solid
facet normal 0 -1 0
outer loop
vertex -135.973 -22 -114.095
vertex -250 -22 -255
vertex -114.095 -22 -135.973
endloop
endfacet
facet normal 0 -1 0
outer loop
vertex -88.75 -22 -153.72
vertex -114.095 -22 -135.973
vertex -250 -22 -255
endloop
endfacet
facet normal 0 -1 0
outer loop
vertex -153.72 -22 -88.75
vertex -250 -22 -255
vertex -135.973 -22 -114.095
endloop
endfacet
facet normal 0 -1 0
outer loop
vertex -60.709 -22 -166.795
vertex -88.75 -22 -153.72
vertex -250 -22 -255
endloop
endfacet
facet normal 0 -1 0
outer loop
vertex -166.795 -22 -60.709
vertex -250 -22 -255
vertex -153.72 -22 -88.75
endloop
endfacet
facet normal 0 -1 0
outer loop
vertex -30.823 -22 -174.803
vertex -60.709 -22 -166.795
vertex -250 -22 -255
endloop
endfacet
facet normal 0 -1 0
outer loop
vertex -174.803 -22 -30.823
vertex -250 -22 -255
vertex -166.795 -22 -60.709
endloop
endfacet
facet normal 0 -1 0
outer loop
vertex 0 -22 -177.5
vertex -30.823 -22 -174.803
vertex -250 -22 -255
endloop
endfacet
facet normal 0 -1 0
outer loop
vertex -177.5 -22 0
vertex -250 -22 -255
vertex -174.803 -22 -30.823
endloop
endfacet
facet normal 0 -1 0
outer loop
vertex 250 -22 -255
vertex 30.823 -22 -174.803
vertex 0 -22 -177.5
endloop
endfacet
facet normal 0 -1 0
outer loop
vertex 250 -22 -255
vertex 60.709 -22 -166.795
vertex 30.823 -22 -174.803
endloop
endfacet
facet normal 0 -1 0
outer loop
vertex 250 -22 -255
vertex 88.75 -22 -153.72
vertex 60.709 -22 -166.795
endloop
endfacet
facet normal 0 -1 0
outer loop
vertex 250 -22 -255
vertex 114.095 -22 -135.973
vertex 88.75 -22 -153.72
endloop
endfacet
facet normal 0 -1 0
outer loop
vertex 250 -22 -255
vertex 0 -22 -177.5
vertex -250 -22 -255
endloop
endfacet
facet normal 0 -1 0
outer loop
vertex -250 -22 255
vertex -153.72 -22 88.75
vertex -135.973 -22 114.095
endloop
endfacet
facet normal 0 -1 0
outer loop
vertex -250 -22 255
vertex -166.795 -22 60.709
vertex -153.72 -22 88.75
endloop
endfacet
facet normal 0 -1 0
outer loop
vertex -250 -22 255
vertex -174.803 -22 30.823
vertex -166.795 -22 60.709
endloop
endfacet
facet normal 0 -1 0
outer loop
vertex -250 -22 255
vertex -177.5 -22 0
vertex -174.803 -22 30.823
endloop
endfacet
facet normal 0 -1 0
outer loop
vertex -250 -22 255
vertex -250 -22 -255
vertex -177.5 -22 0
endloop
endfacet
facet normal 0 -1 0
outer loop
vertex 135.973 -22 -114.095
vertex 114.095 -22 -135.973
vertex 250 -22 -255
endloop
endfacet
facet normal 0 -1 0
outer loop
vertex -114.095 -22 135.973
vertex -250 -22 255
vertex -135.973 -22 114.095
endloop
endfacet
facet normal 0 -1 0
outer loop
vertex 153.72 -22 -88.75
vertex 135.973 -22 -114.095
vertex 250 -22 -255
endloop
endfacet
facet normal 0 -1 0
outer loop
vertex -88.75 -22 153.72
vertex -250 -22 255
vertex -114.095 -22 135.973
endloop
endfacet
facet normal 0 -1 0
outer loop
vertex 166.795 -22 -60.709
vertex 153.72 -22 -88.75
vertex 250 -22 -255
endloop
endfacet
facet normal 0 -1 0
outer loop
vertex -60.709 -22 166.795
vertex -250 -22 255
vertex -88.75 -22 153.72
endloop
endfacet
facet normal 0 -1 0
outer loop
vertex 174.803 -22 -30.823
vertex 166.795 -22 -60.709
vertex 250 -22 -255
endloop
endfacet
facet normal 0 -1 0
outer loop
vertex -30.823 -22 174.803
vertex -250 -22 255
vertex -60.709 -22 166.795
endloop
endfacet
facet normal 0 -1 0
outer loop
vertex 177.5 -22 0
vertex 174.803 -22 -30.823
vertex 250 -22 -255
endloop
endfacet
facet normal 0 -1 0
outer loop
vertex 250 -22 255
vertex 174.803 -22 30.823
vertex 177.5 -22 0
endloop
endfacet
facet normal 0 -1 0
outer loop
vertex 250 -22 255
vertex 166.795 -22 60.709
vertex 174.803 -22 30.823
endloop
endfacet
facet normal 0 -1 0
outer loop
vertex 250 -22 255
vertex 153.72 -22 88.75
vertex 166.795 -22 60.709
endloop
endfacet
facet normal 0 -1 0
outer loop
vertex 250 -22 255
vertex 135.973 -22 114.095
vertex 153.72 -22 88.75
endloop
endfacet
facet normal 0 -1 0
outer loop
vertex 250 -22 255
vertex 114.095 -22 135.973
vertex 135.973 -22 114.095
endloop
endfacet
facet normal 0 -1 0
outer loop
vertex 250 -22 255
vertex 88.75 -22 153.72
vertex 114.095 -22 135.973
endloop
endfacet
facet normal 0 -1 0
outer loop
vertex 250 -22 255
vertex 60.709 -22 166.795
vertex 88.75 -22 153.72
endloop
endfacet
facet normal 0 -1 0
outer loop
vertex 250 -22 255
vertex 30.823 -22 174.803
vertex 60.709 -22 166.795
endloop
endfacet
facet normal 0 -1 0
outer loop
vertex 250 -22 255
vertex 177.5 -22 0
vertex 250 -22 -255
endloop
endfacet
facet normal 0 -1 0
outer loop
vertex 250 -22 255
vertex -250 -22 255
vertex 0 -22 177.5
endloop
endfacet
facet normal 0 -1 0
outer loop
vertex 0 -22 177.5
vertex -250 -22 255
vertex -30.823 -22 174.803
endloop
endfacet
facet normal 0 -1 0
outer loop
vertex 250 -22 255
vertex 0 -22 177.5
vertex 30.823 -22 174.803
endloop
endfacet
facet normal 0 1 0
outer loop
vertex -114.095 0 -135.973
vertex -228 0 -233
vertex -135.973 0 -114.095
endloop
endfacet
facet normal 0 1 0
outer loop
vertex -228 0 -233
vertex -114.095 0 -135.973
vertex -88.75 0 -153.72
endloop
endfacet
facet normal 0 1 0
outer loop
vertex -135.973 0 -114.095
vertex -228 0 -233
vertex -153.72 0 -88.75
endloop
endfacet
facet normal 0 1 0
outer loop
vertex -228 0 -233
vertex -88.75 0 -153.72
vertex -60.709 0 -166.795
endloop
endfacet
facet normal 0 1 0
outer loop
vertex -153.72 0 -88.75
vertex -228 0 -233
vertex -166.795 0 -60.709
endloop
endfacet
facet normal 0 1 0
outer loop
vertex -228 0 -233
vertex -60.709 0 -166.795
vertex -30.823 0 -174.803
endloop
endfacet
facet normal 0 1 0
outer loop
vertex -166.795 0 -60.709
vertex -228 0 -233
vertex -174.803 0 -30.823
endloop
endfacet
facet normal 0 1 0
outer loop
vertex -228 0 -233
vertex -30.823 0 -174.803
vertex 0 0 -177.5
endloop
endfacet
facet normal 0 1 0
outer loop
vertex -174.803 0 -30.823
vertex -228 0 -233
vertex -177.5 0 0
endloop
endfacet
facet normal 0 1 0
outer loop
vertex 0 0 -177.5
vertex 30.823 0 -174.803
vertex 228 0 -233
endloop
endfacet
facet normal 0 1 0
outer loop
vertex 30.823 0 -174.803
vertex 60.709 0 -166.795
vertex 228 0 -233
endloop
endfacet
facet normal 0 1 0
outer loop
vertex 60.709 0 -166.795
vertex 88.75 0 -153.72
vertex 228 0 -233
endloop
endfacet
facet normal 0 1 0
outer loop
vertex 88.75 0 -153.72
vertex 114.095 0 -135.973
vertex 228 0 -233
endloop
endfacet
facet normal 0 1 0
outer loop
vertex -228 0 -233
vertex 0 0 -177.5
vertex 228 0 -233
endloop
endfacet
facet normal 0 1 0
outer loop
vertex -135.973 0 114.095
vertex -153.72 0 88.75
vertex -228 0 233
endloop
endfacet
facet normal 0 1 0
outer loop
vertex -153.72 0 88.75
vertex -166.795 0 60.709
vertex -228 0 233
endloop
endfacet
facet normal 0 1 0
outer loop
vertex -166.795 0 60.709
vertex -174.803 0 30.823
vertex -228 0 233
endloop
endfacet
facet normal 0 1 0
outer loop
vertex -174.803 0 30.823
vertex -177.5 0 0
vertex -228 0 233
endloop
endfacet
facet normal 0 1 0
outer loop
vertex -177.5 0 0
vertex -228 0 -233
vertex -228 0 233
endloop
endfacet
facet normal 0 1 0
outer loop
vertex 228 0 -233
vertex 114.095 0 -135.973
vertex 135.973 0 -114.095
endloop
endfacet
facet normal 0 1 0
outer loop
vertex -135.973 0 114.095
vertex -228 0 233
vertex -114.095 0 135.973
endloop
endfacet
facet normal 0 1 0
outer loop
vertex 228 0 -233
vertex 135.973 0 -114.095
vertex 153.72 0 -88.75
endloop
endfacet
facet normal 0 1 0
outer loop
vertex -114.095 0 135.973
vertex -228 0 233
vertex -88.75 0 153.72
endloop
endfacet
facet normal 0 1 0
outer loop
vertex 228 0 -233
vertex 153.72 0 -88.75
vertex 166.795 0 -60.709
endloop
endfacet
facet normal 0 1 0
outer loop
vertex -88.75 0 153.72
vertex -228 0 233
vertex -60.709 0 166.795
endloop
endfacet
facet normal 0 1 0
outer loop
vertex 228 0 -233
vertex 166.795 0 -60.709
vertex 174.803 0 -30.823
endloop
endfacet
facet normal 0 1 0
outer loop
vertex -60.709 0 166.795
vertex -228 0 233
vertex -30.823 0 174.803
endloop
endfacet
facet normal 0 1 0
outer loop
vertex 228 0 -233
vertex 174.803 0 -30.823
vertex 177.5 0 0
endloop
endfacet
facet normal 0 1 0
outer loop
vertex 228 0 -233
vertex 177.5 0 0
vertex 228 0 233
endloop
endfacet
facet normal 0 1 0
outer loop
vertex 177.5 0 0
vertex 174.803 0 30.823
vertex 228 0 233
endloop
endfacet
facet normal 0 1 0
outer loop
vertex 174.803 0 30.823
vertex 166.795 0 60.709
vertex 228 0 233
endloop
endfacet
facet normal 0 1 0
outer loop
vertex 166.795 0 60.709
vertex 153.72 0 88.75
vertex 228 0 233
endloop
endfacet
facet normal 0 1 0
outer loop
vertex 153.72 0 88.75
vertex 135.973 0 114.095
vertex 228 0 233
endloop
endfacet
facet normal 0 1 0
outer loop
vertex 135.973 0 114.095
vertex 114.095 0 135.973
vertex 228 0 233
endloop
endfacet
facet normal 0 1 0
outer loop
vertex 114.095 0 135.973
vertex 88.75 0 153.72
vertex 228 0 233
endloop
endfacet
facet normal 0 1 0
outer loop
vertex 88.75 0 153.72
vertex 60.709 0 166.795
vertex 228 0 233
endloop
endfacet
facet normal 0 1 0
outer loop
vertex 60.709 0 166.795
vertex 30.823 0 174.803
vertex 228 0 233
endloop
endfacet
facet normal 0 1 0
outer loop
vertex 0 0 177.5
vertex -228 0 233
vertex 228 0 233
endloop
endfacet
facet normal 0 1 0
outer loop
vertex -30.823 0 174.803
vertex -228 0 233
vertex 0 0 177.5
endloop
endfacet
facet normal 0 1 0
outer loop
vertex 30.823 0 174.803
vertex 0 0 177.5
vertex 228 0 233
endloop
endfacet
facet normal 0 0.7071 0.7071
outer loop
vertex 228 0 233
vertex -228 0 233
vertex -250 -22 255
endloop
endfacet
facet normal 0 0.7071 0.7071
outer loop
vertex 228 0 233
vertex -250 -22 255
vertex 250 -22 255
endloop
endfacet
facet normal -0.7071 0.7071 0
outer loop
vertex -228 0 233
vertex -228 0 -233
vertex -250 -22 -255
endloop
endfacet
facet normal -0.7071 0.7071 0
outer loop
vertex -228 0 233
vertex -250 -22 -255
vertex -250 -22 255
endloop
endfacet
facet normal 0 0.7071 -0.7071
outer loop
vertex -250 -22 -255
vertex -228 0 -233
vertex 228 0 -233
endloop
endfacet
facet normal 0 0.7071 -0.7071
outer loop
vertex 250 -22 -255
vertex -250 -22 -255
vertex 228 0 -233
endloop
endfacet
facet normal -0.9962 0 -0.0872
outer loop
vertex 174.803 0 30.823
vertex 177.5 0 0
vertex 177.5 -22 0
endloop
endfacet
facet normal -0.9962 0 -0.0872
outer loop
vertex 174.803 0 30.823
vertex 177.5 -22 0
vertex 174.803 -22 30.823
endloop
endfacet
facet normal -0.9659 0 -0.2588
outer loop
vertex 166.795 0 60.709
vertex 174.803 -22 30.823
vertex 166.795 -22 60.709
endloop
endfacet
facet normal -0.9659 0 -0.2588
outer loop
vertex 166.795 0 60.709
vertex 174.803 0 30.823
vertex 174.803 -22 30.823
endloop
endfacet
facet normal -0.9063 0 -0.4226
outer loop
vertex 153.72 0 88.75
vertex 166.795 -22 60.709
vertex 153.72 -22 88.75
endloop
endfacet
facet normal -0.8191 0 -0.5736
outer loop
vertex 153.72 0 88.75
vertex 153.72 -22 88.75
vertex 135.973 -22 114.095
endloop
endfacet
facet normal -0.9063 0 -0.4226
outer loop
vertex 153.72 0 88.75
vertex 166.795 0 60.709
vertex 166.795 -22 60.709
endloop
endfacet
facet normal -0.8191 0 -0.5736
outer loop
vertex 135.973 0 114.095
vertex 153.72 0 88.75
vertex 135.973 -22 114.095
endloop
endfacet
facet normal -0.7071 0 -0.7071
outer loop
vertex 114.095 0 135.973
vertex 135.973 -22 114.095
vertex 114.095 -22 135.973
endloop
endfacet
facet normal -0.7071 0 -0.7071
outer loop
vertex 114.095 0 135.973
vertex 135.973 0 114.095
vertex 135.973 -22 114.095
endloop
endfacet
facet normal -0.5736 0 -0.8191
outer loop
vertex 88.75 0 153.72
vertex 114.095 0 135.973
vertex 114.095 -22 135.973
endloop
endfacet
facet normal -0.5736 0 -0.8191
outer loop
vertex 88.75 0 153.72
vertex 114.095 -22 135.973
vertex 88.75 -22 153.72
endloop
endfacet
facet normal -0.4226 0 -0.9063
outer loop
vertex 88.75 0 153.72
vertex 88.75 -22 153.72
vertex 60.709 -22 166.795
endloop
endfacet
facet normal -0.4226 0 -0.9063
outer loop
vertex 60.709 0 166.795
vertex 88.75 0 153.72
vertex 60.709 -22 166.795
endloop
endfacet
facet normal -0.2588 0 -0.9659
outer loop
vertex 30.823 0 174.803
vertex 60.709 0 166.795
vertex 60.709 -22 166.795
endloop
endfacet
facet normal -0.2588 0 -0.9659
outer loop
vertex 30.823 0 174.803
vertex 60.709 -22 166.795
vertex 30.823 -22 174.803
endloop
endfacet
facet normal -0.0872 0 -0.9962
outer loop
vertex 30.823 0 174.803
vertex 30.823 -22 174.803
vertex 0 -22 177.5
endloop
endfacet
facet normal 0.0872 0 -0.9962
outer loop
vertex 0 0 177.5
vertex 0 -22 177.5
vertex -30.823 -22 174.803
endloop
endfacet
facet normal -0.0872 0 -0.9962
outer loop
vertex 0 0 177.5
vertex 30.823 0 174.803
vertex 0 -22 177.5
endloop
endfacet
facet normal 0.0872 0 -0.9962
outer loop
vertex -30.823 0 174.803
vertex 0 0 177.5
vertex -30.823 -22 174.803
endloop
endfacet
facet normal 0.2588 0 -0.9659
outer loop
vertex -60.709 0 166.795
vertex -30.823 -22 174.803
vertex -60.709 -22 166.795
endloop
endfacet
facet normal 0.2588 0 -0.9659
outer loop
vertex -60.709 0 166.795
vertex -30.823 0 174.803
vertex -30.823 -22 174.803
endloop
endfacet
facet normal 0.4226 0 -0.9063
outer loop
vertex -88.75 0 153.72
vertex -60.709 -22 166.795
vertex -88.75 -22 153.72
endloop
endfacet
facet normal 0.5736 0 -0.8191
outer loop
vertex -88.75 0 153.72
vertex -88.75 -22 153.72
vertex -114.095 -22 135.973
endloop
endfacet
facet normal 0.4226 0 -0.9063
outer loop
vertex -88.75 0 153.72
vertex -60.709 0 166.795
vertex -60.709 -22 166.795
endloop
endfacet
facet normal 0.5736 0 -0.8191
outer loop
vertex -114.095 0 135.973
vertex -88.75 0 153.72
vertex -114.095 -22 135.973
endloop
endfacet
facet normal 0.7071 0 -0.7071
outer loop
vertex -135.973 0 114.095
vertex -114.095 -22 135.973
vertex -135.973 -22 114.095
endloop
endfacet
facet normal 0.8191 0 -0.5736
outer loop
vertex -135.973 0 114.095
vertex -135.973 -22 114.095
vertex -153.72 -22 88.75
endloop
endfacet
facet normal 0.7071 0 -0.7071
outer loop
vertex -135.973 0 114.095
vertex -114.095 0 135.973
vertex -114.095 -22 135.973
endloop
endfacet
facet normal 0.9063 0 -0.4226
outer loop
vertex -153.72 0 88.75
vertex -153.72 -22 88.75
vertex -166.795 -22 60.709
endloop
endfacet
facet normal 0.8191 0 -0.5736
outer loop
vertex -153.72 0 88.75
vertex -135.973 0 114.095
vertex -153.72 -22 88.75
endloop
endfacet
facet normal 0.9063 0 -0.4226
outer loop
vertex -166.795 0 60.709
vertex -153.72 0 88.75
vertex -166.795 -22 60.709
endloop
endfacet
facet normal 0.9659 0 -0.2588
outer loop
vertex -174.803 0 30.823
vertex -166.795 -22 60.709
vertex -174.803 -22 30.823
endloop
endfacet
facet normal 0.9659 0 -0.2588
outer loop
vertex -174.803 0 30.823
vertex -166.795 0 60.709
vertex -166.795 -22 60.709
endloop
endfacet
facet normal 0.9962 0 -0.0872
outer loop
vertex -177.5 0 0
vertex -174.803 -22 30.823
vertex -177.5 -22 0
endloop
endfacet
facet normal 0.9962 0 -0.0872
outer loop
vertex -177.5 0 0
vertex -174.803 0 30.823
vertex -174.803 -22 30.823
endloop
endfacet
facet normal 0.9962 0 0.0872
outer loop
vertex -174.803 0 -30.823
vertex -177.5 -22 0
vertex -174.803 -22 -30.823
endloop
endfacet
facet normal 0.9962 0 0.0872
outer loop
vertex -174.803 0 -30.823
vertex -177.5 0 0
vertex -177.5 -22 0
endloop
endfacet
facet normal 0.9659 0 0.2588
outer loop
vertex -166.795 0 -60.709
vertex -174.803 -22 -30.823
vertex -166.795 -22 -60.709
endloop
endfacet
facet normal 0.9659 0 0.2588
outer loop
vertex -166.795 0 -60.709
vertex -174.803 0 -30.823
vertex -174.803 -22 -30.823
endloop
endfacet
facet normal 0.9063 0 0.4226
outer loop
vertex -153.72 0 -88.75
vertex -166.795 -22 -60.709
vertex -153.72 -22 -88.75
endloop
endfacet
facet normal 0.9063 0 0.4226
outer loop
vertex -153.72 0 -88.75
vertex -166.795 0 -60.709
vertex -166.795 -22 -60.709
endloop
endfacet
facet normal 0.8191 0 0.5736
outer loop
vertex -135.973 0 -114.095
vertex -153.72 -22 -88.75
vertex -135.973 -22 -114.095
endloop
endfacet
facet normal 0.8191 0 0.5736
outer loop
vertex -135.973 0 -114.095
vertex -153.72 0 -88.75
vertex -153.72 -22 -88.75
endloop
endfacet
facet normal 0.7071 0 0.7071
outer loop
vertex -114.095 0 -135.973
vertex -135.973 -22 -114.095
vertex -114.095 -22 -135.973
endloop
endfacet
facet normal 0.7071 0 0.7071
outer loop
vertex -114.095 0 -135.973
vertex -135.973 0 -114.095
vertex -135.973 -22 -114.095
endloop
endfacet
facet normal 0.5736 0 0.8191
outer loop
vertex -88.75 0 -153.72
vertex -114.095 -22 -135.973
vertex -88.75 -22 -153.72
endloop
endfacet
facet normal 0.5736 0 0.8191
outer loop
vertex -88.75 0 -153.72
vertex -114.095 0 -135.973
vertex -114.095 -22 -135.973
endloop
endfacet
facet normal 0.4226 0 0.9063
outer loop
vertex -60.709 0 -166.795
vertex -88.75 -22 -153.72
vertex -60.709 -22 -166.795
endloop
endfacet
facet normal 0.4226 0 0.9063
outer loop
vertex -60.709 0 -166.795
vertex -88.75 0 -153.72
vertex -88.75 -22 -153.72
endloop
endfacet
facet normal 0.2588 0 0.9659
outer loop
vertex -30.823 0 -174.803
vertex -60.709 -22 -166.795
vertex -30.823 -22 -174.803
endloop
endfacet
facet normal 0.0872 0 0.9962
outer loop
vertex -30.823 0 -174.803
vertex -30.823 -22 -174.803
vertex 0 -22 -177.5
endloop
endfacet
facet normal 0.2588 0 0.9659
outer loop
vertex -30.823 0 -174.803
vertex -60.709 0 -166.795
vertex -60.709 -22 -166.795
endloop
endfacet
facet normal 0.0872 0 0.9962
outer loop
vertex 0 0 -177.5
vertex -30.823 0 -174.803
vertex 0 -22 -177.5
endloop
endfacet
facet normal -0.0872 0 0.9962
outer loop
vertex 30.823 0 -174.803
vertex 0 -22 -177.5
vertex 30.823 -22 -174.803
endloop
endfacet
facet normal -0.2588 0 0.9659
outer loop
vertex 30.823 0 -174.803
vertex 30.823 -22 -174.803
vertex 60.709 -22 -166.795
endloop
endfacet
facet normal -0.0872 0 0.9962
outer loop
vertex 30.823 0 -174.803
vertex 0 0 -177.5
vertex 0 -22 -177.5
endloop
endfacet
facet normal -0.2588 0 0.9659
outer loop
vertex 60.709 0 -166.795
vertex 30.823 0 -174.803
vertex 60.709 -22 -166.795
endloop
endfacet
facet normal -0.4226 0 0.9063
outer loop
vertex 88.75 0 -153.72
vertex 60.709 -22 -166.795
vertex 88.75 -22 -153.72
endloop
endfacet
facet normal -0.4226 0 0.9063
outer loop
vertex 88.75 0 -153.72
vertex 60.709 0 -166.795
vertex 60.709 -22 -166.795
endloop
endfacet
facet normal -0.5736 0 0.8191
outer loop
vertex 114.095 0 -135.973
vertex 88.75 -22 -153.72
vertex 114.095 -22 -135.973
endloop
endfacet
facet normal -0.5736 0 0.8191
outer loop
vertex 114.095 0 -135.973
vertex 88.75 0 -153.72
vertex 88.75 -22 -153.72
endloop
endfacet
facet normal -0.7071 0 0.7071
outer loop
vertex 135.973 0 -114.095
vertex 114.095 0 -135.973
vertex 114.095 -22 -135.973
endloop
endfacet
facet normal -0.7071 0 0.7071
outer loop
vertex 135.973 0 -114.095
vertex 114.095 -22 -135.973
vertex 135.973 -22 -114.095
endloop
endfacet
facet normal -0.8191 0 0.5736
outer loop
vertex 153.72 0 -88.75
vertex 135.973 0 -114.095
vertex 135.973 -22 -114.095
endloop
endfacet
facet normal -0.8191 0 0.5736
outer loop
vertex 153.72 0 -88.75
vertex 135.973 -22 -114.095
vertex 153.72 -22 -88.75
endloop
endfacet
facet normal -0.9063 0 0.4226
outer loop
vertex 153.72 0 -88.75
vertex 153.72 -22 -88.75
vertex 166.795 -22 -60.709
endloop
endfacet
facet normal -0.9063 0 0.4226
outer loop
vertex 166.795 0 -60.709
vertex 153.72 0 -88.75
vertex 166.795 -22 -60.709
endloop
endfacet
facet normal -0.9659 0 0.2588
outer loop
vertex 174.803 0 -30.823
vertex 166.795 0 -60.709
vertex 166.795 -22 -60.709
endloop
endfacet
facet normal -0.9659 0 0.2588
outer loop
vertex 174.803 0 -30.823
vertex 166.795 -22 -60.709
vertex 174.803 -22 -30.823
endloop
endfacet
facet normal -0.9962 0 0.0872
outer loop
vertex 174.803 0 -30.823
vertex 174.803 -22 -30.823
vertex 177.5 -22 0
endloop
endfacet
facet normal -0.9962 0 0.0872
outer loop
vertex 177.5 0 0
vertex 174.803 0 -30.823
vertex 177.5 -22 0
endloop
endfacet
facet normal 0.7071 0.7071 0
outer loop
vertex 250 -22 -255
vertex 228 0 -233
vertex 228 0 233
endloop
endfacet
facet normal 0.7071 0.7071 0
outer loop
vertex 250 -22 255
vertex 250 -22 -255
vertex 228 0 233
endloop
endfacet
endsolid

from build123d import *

# Parameters (mm, degrees)
F0_W     = 500
F0_H     = 510
F0_R     = 177.5
F1_DEPTH = 22
F2_SIZE  = 21.99999


# Not quite as in the source:
# - a fillet or chamfer is up to 0.001 mm smaller than in the source, because OpenCascade refuses the exact size


with BuildPart() as f1:
    # F0 (on Front) → F1 (new body)
    with BuildSketch(Plane.XZ):
        Rectangle(F0_W, F0_H)
        with BuildLine():
            Line((-161.5, 206.5), (161.5, 206.5))
            ThreePointArc((161.5, 206.5), (189.7842712475, 194.7842712475), (201.5, 166.5))
            Line((201.5, 166.5), (201.5, -166.5))
            ThreePointArc((201.5, -166.5), (189.7842712475, -194.7842712475), (161.5, -206.5))
            Line((161.5, -206.5), (-161.5, -206.5))
            ThreePointArc((-161.5, -206.5), (-189.7842712475, -194.7842712475), (-201.5, -166.5))
            Line((-201.5, -166.5), (-201.5, 166.5))
            ThreePointArc((-201.5, 166.5), (-189.7842712475, 194.7842712475), (-161.5, 206.5))
        make_face(mode=Mode.SUBTRACT)
        with BuildLine():
            ThreePointArc((201.5, 166.5), (189.7842712475, 194.7842712475), (161.5, 206.5))
            Line((161.5, 206.5), (-161.5, 206.5))
            ThreePointArc((-161.5, 206.5), (-189.7842712475, 194.7842712475), (-201.5, 166.5))
            Line((-201.5, 166.5), (-201.5, -166.5))
            ThreePointArc((-201.5, -166.5), (-189.7842712475, -194.7842712475), (-161.5, -206.5))
            Line((-161.5, -206.5), (161.5, -206.5))
            ThreePointArc((161.5, -206.5), (189.7842712475, -194.7842712475), (201.5, -166.5))
            Line((201.5, -166.5), (201.5, 166.5))
        make_face()
        Circle(F0_R, mode=Mode.SUBTRACT)
    extrude(amount=F1_DEPTH)

    # F2 (size 22 in the source; OpenCascade refuses exactly that, so slightly less here)
    f2_edges = [f1.edges().sort_by_distance(p)[0] for p in [
        (0, 0, 255),
        (250, 0, 0),
        (0, 0, -255),
        (-250, 0, 0),
    ]]
    chamfer(f2_edges, length=F2_SIZE)


solid = f1.part
